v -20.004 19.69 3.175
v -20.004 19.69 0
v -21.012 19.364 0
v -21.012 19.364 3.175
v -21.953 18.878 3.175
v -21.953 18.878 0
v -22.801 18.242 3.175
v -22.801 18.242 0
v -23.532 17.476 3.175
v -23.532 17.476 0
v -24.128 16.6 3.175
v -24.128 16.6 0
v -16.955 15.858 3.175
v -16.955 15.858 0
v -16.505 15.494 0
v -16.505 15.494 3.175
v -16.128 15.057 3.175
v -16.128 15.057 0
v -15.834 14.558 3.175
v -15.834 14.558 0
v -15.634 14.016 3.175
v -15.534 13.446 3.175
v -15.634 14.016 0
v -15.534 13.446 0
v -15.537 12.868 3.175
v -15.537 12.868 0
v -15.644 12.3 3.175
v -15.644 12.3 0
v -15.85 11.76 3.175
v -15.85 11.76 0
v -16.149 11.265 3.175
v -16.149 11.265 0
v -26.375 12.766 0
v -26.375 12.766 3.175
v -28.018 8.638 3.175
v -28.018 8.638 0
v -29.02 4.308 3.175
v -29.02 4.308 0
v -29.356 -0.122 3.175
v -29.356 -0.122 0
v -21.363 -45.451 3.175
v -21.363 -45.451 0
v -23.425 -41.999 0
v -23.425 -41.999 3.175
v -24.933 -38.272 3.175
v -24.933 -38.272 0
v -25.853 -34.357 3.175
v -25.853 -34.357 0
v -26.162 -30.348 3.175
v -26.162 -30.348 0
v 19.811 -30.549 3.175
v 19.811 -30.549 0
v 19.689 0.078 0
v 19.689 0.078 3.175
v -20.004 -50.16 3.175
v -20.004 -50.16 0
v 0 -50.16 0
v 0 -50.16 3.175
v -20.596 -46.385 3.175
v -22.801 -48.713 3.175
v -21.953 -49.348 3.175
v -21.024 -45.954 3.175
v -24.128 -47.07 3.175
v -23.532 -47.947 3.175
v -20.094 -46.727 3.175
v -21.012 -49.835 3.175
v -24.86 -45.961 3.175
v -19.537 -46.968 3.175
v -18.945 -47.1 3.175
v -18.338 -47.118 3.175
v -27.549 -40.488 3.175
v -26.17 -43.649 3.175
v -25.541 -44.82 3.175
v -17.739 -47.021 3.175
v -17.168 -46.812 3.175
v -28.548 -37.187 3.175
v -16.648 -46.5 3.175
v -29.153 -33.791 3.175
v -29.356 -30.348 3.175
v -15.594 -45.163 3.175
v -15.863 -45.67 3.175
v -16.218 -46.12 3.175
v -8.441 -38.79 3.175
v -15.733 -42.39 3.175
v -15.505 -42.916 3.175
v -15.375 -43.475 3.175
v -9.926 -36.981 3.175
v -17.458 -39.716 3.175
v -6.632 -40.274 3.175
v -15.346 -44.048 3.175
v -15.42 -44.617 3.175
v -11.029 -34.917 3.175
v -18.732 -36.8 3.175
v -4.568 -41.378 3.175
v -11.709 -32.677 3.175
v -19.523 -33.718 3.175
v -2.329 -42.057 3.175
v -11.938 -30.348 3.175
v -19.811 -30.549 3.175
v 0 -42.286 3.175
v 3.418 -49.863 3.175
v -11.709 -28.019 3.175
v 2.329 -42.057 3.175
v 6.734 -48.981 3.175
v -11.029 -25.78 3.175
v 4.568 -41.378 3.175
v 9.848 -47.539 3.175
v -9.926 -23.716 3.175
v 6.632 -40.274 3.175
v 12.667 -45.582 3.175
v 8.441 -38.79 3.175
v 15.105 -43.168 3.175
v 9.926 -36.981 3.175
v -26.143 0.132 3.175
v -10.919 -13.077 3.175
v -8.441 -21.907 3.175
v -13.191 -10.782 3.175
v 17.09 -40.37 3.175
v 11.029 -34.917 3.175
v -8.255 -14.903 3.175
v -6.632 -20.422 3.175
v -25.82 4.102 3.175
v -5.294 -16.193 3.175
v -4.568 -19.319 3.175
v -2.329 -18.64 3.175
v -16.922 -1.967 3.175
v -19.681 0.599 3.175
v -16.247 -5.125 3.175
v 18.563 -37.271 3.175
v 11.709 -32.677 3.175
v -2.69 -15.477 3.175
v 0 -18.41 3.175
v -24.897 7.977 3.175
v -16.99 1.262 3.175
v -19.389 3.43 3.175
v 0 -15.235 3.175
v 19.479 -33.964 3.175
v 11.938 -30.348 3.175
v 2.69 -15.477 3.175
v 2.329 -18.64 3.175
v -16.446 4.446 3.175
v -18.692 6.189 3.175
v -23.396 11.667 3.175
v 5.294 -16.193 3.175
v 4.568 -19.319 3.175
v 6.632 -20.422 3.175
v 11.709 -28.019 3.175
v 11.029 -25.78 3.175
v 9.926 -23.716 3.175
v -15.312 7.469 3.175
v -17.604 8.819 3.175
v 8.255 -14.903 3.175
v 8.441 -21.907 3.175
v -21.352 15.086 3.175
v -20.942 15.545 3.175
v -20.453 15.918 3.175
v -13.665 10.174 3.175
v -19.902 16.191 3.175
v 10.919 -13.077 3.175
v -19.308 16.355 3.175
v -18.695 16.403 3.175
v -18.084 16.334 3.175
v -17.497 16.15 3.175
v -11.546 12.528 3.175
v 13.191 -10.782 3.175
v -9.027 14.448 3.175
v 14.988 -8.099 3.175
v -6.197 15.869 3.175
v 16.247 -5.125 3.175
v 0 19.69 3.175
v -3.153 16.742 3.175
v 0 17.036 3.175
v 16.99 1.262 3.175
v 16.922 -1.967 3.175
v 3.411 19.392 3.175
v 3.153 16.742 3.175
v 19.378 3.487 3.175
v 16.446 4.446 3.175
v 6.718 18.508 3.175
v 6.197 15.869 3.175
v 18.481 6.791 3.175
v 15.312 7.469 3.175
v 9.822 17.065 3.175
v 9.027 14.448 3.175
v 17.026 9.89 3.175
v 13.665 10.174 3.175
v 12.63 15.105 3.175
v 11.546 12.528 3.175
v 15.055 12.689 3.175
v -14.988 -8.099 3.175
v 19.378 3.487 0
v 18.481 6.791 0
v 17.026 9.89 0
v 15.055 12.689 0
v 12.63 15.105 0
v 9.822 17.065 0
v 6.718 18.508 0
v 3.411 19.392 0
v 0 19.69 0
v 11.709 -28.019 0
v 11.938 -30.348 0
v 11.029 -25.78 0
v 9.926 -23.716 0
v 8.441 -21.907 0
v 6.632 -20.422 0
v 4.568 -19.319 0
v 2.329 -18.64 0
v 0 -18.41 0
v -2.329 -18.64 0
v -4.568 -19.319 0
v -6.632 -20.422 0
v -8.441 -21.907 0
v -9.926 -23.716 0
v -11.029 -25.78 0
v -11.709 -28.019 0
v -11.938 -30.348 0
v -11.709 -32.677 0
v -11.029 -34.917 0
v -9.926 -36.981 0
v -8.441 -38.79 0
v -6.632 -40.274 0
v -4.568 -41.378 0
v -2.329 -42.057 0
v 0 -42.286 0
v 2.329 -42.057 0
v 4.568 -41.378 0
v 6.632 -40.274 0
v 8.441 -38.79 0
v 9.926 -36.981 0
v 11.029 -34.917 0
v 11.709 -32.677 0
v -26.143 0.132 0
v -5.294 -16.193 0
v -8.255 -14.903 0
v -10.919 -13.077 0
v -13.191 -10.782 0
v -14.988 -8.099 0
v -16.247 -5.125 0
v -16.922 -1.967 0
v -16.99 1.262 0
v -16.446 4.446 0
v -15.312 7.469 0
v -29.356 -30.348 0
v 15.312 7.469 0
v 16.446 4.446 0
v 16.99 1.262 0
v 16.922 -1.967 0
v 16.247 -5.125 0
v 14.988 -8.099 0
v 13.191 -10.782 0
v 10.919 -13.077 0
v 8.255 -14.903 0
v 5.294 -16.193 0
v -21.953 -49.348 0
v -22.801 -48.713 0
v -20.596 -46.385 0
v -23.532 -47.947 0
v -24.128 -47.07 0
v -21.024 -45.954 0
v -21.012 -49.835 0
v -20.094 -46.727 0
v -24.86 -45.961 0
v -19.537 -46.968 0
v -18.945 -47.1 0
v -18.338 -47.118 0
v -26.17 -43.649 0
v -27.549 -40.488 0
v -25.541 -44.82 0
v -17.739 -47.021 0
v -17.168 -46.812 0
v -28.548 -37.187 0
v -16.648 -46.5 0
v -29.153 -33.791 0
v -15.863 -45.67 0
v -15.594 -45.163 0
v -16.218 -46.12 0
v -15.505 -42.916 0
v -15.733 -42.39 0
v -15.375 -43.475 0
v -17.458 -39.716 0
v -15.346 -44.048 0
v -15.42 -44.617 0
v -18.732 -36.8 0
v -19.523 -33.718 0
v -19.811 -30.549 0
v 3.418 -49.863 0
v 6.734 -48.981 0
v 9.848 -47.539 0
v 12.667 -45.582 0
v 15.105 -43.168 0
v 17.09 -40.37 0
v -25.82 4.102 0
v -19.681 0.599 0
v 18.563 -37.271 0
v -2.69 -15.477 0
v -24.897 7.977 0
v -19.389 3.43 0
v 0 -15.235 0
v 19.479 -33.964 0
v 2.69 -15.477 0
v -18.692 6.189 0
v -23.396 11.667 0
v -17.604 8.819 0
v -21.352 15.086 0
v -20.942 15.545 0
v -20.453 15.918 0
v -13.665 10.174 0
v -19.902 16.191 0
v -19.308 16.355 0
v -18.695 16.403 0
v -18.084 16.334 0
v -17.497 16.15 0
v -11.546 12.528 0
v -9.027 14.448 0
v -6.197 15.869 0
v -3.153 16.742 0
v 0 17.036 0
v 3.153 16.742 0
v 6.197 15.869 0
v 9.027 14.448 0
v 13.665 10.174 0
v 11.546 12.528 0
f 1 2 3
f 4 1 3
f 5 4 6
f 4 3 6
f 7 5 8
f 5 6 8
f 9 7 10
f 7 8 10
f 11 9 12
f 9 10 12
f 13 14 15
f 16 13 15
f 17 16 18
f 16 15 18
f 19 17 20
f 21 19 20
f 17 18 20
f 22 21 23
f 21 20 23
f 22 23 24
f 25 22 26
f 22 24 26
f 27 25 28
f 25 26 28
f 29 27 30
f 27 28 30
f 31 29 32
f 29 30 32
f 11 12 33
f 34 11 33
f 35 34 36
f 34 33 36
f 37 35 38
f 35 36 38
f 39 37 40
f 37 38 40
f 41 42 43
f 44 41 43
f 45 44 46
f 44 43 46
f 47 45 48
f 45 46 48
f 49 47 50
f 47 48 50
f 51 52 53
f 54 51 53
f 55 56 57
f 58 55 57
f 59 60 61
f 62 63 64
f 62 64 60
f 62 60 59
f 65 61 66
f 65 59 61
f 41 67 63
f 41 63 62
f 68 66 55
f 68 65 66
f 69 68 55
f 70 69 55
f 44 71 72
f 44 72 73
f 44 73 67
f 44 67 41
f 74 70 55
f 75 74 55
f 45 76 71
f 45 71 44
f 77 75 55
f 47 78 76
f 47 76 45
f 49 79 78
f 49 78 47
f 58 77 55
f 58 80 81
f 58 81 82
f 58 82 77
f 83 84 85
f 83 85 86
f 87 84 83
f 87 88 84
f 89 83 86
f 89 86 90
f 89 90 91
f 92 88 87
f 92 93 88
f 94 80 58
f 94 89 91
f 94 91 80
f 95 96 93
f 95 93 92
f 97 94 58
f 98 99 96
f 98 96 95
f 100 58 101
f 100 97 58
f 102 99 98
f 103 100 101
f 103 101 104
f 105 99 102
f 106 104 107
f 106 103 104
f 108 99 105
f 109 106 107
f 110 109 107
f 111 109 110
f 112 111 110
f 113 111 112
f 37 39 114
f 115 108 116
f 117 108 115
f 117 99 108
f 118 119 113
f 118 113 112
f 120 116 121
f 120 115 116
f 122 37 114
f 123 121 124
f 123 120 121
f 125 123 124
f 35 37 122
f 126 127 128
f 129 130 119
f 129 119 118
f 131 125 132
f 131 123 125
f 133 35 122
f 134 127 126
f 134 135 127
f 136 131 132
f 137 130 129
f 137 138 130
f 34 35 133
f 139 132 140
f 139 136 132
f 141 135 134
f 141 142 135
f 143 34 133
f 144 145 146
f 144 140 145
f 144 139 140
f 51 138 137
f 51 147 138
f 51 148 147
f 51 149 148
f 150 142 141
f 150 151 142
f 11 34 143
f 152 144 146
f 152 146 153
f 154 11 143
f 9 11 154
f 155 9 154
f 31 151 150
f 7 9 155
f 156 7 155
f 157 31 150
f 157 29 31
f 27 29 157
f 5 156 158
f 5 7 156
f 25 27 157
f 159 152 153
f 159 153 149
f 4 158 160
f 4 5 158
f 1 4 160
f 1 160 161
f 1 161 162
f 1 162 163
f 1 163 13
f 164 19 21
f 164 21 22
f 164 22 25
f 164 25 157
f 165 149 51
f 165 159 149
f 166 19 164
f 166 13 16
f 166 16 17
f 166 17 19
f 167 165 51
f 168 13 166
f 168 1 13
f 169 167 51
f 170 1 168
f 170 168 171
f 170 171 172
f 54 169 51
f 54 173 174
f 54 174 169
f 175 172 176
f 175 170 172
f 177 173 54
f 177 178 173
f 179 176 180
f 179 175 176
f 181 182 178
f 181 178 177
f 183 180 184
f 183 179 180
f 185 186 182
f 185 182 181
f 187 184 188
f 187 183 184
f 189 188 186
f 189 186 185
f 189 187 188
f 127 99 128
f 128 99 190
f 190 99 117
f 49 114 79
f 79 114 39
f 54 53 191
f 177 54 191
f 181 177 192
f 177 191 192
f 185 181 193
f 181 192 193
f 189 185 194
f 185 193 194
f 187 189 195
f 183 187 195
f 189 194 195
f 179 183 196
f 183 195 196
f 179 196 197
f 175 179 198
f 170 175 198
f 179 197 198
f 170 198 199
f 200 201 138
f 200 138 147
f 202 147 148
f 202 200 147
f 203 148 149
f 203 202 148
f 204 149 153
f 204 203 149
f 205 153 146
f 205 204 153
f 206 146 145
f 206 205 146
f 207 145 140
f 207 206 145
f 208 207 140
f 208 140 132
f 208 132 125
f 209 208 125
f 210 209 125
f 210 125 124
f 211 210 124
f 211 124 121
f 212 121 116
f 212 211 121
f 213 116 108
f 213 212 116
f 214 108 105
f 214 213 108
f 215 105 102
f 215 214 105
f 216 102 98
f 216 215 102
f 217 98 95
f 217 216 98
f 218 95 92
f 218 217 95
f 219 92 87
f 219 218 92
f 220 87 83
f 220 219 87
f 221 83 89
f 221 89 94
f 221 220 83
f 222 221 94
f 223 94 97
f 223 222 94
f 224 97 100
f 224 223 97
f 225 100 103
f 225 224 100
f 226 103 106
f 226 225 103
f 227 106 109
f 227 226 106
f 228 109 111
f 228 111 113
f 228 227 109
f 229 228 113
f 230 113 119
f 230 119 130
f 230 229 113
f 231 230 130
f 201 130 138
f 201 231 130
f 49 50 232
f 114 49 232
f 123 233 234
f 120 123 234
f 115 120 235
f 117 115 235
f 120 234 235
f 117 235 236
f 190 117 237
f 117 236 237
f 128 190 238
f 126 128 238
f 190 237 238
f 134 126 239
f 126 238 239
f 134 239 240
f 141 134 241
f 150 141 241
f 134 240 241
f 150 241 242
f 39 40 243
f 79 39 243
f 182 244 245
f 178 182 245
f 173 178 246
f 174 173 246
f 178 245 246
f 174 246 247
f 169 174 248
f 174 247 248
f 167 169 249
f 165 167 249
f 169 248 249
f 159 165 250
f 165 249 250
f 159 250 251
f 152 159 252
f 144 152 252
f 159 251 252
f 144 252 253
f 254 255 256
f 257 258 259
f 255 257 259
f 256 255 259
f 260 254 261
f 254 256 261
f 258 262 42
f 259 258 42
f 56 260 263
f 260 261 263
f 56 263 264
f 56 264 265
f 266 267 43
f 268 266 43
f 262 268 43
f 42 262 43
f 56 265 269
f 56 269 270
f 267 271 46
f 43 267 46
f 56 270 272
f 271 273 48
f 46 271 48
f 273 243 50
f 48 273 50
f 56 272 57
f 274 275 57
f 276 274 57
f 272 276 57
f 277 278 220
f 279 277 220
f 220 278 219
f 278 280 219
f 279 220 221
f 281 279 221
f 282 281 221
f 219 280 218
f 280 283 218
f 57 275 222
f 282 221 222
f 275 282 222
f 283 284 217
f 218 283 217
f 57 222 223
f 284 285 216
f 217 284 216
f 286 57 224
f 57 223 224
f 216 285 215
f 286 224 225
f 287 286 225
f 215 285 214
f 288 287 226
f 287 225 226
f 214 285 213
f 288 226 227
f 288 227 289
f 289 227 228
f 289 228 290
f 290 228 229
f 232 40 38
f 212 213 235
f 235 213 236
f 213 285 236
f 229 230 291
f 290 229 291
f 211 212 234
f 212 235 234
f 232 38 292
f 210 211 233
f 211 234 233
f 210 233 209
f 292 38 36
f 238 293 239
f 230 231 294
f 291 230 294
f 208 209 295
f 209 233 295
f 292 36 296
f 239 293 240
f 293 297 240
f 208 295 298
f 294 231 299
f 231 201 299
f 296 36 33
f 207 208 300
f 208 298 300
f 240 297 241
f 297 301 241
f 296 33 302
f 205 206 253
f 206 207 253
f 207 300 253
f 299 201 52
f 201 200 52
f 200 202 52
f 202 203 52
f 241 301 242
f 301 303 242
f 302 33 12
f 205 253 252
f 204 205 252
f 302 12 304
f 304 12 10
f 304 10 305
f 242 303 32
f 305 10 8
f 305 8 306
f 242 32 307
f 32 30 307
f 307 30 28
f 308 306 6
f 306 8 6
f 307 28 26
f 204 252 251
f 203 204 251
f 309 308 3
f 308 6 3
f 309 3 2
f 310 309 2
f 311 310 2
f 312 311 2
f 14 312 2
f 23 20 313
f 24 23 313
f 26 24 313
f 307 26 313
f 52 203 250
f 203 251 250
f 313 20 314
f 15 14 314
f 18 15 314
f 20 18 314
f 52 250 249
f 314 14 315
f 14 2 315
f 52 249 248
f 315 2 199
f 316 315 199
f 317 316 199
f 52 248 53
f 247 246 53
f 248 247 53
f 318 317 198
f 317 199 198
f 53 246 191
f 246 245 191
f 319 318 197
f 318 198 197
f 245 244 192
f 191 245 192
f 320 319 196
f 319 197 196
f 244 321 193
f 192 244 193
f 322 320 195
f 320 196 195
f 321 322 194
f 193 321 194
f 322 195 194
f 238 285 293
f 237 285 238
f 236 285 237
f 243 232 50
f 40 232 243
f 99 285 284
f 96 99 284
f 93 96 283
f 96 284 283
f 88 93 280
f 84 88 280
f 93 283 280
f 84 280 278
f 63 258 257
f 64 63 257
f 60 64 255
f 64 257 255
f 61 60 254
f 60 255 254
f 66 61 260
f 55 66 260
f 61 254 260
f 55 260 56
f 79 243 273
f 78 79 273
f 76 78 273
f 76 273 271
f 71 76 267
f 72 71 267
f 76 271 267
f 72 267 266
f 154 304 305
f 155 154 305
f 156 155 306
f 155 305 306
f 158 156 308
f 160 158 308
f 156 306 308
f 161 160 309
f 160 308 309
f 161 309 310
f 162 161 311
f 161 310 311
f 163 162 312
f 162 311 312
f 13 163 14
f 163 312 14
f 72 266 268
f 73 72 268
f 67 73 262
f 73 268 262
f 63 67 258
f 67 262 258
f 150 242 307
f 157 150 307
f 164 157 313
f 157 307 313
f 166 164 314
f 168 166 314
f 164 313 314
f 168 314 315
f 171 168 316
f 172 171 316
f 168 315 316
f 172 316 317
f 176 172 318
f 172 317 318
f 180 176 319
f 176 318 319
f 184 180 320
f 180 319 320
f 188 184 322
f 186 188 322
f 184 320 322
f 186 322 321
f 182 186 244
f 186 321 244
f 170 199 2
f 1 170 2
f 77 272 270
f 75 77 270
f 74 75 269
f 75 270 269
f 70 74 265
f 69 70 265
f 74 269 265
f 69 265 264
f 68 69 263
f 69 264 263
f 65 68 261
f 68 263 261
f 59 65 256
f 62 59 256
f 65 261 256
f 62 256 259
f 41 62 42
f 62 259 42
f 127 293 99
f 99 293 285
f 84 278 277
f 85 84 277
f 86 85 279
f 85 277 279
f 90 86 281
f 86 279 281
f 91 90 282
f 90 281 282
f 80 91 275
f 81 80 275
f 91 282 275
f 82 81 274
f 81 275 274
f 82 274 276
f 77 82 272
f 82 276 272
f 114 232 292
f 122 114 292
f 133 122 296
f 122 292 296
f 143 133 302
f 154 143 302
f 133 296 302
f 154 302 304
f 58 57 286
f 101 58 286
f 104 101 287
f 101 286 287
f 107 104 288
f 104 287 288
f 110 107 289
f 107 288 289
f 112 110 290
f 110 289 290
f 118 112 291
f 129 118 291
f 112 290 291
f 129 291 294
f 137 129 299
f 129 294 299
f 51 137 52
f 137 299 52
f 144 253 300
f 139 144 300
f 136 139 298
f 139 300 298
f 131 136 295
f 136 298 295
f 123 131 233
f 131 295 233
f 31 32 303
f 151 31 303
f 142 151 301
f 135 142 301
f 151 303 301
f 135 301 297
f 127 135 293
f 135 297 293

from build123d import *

# Parameters (mm, degrees)
F0_R     = 11.938
F1_DEPTH = 3.175


# Not quite as in the source:
# - a feature names something its author has since deleted; it is built from what else it names


with BuildPart() as f1:
    # F0 (on Top) → F1 (new body)
    with BuildSketch(Plane.XY):
        with BuildLine():
            ThreePointArc((19.6894808556, 0.0781131055), (13.8950303962, 13.9502648114), (0, 19.6896358021))
            Line((0, 19.6896358021), (-20.0037127642, 19.6896358021))
            ThreePointArc((-20.0037127642, 19.6896358021), (-22.390015477, 18.5774210568), (-24.1276545988, 16.5995250638))
            ThreePointArc((-24.1276545988, 16.5995250638), (-28.0183229898, 8.6377085048), (-29.3558392303, -0.1223641979))
            Line((-29.3558392303, -0.1223641979), (-29.3558392303, -30.3483641979))
            ThreePointArc((-29.3558392303, -30.3483641979), (-28.5482645978, -37.1866304526), (-26.1699732087, -43.6486573967))
            ThreePointArc((-26.1699732087, -43.6486573967), (-25.2069369553, -45.3941485327), (-24.1276545988, -47.0702534596))
            ThreePointArc((-24.1276545988, -47.0702534596), (-22.390015477, -49.0481494526), (-20.0037127642, -50.1603641979))
            Line((-20.0037127642, -50.1603641979), (0, -50.1603641979))
            ThreePointArc((0, -50.1603641979), (13.9381398986, -44.4282647716), (19.8109856608, -30.5488415012))
            Line((19.8109856608, -30.5488415012), (19.6894808556, 0.0781131055))
        make_face()
        with BuildLine():
            Line((-19.6805191444, 0.5991028516), (-19.8109856608, -30.5488415012))
            ThreePointArc((-19.8109856608, -30.5488415012), (-18.7320573688, -36.8001368793), (-15.7326179982, -42.3899618877))
            ThreePointArc((-15.7326179982, -42.3899618877), (-15.4201129826, -44.616632299), (-16.6477696645, -46.5003996883))
            ThreePointArc((-16.6477696645, -46.5003996883), (-19.2439967199, -47.0478700205), (-21.3627294259, -45.4506566945))
            ThreePointArc((-21.3627294259, -45.4506566945), (-24.9332630835, -38.2716109559), (-26.1619083245, -30.3483641979))
            Line((-26.1619083245, -30.3483641979), (-26.1434258244, 0.1322556929))
            ThreePointArc((-26.1434258244, 0.1322556929), (-24.8969528592, 7.9773393892), (-21.3520418939, 15.0859707133))
            ThreePointArc((-21.3520418939, 15.0859707133), (-19.3084814881, 16.3545849229), (-16.9550367483, 15.8577761045))
            ThreePointArc((-16.9550367483, 15.8577761045), (-15.5712636207, 13.7334477776), (-16.1488403601, 11.2648441198))
            ThreePointArc((-16.1488403601, 11.2648441198), (-18.6915825929, 6.1892243613), (-19.6805191444, 0.5991028516))
        make_face(mode=Mode.SUBTRACT)
        with Locations((0, -30.3483641979)):
            Circle(F0_R, mode=Mode.SUBTRACT)
        with BuildLine():
            ThreePointArc((-15.3116747346, 7.469335274), (0, 17.0363832022), (15.3116747346, 7.469335274))
            ThreePointArc((15.3116747346, 7.469335274), (15.6883641196, -6.6418057683), (5.2940419625, -16.1929451402))
            ThreePointArc((5.2940419625, -16.1929451402), (0, -15.2353641979), (-5.2940419625, -16.1929451402))
            ThreePointArc((-5.2940419625, -16.1929451402), (-15.6883641196, -6.6418057683), (-15.3116747346, 7.469335274))
        make_face(mode=Mode.SUBTRACT)
    extrude(amount=F1_DEPTH)


solid = f1.part
